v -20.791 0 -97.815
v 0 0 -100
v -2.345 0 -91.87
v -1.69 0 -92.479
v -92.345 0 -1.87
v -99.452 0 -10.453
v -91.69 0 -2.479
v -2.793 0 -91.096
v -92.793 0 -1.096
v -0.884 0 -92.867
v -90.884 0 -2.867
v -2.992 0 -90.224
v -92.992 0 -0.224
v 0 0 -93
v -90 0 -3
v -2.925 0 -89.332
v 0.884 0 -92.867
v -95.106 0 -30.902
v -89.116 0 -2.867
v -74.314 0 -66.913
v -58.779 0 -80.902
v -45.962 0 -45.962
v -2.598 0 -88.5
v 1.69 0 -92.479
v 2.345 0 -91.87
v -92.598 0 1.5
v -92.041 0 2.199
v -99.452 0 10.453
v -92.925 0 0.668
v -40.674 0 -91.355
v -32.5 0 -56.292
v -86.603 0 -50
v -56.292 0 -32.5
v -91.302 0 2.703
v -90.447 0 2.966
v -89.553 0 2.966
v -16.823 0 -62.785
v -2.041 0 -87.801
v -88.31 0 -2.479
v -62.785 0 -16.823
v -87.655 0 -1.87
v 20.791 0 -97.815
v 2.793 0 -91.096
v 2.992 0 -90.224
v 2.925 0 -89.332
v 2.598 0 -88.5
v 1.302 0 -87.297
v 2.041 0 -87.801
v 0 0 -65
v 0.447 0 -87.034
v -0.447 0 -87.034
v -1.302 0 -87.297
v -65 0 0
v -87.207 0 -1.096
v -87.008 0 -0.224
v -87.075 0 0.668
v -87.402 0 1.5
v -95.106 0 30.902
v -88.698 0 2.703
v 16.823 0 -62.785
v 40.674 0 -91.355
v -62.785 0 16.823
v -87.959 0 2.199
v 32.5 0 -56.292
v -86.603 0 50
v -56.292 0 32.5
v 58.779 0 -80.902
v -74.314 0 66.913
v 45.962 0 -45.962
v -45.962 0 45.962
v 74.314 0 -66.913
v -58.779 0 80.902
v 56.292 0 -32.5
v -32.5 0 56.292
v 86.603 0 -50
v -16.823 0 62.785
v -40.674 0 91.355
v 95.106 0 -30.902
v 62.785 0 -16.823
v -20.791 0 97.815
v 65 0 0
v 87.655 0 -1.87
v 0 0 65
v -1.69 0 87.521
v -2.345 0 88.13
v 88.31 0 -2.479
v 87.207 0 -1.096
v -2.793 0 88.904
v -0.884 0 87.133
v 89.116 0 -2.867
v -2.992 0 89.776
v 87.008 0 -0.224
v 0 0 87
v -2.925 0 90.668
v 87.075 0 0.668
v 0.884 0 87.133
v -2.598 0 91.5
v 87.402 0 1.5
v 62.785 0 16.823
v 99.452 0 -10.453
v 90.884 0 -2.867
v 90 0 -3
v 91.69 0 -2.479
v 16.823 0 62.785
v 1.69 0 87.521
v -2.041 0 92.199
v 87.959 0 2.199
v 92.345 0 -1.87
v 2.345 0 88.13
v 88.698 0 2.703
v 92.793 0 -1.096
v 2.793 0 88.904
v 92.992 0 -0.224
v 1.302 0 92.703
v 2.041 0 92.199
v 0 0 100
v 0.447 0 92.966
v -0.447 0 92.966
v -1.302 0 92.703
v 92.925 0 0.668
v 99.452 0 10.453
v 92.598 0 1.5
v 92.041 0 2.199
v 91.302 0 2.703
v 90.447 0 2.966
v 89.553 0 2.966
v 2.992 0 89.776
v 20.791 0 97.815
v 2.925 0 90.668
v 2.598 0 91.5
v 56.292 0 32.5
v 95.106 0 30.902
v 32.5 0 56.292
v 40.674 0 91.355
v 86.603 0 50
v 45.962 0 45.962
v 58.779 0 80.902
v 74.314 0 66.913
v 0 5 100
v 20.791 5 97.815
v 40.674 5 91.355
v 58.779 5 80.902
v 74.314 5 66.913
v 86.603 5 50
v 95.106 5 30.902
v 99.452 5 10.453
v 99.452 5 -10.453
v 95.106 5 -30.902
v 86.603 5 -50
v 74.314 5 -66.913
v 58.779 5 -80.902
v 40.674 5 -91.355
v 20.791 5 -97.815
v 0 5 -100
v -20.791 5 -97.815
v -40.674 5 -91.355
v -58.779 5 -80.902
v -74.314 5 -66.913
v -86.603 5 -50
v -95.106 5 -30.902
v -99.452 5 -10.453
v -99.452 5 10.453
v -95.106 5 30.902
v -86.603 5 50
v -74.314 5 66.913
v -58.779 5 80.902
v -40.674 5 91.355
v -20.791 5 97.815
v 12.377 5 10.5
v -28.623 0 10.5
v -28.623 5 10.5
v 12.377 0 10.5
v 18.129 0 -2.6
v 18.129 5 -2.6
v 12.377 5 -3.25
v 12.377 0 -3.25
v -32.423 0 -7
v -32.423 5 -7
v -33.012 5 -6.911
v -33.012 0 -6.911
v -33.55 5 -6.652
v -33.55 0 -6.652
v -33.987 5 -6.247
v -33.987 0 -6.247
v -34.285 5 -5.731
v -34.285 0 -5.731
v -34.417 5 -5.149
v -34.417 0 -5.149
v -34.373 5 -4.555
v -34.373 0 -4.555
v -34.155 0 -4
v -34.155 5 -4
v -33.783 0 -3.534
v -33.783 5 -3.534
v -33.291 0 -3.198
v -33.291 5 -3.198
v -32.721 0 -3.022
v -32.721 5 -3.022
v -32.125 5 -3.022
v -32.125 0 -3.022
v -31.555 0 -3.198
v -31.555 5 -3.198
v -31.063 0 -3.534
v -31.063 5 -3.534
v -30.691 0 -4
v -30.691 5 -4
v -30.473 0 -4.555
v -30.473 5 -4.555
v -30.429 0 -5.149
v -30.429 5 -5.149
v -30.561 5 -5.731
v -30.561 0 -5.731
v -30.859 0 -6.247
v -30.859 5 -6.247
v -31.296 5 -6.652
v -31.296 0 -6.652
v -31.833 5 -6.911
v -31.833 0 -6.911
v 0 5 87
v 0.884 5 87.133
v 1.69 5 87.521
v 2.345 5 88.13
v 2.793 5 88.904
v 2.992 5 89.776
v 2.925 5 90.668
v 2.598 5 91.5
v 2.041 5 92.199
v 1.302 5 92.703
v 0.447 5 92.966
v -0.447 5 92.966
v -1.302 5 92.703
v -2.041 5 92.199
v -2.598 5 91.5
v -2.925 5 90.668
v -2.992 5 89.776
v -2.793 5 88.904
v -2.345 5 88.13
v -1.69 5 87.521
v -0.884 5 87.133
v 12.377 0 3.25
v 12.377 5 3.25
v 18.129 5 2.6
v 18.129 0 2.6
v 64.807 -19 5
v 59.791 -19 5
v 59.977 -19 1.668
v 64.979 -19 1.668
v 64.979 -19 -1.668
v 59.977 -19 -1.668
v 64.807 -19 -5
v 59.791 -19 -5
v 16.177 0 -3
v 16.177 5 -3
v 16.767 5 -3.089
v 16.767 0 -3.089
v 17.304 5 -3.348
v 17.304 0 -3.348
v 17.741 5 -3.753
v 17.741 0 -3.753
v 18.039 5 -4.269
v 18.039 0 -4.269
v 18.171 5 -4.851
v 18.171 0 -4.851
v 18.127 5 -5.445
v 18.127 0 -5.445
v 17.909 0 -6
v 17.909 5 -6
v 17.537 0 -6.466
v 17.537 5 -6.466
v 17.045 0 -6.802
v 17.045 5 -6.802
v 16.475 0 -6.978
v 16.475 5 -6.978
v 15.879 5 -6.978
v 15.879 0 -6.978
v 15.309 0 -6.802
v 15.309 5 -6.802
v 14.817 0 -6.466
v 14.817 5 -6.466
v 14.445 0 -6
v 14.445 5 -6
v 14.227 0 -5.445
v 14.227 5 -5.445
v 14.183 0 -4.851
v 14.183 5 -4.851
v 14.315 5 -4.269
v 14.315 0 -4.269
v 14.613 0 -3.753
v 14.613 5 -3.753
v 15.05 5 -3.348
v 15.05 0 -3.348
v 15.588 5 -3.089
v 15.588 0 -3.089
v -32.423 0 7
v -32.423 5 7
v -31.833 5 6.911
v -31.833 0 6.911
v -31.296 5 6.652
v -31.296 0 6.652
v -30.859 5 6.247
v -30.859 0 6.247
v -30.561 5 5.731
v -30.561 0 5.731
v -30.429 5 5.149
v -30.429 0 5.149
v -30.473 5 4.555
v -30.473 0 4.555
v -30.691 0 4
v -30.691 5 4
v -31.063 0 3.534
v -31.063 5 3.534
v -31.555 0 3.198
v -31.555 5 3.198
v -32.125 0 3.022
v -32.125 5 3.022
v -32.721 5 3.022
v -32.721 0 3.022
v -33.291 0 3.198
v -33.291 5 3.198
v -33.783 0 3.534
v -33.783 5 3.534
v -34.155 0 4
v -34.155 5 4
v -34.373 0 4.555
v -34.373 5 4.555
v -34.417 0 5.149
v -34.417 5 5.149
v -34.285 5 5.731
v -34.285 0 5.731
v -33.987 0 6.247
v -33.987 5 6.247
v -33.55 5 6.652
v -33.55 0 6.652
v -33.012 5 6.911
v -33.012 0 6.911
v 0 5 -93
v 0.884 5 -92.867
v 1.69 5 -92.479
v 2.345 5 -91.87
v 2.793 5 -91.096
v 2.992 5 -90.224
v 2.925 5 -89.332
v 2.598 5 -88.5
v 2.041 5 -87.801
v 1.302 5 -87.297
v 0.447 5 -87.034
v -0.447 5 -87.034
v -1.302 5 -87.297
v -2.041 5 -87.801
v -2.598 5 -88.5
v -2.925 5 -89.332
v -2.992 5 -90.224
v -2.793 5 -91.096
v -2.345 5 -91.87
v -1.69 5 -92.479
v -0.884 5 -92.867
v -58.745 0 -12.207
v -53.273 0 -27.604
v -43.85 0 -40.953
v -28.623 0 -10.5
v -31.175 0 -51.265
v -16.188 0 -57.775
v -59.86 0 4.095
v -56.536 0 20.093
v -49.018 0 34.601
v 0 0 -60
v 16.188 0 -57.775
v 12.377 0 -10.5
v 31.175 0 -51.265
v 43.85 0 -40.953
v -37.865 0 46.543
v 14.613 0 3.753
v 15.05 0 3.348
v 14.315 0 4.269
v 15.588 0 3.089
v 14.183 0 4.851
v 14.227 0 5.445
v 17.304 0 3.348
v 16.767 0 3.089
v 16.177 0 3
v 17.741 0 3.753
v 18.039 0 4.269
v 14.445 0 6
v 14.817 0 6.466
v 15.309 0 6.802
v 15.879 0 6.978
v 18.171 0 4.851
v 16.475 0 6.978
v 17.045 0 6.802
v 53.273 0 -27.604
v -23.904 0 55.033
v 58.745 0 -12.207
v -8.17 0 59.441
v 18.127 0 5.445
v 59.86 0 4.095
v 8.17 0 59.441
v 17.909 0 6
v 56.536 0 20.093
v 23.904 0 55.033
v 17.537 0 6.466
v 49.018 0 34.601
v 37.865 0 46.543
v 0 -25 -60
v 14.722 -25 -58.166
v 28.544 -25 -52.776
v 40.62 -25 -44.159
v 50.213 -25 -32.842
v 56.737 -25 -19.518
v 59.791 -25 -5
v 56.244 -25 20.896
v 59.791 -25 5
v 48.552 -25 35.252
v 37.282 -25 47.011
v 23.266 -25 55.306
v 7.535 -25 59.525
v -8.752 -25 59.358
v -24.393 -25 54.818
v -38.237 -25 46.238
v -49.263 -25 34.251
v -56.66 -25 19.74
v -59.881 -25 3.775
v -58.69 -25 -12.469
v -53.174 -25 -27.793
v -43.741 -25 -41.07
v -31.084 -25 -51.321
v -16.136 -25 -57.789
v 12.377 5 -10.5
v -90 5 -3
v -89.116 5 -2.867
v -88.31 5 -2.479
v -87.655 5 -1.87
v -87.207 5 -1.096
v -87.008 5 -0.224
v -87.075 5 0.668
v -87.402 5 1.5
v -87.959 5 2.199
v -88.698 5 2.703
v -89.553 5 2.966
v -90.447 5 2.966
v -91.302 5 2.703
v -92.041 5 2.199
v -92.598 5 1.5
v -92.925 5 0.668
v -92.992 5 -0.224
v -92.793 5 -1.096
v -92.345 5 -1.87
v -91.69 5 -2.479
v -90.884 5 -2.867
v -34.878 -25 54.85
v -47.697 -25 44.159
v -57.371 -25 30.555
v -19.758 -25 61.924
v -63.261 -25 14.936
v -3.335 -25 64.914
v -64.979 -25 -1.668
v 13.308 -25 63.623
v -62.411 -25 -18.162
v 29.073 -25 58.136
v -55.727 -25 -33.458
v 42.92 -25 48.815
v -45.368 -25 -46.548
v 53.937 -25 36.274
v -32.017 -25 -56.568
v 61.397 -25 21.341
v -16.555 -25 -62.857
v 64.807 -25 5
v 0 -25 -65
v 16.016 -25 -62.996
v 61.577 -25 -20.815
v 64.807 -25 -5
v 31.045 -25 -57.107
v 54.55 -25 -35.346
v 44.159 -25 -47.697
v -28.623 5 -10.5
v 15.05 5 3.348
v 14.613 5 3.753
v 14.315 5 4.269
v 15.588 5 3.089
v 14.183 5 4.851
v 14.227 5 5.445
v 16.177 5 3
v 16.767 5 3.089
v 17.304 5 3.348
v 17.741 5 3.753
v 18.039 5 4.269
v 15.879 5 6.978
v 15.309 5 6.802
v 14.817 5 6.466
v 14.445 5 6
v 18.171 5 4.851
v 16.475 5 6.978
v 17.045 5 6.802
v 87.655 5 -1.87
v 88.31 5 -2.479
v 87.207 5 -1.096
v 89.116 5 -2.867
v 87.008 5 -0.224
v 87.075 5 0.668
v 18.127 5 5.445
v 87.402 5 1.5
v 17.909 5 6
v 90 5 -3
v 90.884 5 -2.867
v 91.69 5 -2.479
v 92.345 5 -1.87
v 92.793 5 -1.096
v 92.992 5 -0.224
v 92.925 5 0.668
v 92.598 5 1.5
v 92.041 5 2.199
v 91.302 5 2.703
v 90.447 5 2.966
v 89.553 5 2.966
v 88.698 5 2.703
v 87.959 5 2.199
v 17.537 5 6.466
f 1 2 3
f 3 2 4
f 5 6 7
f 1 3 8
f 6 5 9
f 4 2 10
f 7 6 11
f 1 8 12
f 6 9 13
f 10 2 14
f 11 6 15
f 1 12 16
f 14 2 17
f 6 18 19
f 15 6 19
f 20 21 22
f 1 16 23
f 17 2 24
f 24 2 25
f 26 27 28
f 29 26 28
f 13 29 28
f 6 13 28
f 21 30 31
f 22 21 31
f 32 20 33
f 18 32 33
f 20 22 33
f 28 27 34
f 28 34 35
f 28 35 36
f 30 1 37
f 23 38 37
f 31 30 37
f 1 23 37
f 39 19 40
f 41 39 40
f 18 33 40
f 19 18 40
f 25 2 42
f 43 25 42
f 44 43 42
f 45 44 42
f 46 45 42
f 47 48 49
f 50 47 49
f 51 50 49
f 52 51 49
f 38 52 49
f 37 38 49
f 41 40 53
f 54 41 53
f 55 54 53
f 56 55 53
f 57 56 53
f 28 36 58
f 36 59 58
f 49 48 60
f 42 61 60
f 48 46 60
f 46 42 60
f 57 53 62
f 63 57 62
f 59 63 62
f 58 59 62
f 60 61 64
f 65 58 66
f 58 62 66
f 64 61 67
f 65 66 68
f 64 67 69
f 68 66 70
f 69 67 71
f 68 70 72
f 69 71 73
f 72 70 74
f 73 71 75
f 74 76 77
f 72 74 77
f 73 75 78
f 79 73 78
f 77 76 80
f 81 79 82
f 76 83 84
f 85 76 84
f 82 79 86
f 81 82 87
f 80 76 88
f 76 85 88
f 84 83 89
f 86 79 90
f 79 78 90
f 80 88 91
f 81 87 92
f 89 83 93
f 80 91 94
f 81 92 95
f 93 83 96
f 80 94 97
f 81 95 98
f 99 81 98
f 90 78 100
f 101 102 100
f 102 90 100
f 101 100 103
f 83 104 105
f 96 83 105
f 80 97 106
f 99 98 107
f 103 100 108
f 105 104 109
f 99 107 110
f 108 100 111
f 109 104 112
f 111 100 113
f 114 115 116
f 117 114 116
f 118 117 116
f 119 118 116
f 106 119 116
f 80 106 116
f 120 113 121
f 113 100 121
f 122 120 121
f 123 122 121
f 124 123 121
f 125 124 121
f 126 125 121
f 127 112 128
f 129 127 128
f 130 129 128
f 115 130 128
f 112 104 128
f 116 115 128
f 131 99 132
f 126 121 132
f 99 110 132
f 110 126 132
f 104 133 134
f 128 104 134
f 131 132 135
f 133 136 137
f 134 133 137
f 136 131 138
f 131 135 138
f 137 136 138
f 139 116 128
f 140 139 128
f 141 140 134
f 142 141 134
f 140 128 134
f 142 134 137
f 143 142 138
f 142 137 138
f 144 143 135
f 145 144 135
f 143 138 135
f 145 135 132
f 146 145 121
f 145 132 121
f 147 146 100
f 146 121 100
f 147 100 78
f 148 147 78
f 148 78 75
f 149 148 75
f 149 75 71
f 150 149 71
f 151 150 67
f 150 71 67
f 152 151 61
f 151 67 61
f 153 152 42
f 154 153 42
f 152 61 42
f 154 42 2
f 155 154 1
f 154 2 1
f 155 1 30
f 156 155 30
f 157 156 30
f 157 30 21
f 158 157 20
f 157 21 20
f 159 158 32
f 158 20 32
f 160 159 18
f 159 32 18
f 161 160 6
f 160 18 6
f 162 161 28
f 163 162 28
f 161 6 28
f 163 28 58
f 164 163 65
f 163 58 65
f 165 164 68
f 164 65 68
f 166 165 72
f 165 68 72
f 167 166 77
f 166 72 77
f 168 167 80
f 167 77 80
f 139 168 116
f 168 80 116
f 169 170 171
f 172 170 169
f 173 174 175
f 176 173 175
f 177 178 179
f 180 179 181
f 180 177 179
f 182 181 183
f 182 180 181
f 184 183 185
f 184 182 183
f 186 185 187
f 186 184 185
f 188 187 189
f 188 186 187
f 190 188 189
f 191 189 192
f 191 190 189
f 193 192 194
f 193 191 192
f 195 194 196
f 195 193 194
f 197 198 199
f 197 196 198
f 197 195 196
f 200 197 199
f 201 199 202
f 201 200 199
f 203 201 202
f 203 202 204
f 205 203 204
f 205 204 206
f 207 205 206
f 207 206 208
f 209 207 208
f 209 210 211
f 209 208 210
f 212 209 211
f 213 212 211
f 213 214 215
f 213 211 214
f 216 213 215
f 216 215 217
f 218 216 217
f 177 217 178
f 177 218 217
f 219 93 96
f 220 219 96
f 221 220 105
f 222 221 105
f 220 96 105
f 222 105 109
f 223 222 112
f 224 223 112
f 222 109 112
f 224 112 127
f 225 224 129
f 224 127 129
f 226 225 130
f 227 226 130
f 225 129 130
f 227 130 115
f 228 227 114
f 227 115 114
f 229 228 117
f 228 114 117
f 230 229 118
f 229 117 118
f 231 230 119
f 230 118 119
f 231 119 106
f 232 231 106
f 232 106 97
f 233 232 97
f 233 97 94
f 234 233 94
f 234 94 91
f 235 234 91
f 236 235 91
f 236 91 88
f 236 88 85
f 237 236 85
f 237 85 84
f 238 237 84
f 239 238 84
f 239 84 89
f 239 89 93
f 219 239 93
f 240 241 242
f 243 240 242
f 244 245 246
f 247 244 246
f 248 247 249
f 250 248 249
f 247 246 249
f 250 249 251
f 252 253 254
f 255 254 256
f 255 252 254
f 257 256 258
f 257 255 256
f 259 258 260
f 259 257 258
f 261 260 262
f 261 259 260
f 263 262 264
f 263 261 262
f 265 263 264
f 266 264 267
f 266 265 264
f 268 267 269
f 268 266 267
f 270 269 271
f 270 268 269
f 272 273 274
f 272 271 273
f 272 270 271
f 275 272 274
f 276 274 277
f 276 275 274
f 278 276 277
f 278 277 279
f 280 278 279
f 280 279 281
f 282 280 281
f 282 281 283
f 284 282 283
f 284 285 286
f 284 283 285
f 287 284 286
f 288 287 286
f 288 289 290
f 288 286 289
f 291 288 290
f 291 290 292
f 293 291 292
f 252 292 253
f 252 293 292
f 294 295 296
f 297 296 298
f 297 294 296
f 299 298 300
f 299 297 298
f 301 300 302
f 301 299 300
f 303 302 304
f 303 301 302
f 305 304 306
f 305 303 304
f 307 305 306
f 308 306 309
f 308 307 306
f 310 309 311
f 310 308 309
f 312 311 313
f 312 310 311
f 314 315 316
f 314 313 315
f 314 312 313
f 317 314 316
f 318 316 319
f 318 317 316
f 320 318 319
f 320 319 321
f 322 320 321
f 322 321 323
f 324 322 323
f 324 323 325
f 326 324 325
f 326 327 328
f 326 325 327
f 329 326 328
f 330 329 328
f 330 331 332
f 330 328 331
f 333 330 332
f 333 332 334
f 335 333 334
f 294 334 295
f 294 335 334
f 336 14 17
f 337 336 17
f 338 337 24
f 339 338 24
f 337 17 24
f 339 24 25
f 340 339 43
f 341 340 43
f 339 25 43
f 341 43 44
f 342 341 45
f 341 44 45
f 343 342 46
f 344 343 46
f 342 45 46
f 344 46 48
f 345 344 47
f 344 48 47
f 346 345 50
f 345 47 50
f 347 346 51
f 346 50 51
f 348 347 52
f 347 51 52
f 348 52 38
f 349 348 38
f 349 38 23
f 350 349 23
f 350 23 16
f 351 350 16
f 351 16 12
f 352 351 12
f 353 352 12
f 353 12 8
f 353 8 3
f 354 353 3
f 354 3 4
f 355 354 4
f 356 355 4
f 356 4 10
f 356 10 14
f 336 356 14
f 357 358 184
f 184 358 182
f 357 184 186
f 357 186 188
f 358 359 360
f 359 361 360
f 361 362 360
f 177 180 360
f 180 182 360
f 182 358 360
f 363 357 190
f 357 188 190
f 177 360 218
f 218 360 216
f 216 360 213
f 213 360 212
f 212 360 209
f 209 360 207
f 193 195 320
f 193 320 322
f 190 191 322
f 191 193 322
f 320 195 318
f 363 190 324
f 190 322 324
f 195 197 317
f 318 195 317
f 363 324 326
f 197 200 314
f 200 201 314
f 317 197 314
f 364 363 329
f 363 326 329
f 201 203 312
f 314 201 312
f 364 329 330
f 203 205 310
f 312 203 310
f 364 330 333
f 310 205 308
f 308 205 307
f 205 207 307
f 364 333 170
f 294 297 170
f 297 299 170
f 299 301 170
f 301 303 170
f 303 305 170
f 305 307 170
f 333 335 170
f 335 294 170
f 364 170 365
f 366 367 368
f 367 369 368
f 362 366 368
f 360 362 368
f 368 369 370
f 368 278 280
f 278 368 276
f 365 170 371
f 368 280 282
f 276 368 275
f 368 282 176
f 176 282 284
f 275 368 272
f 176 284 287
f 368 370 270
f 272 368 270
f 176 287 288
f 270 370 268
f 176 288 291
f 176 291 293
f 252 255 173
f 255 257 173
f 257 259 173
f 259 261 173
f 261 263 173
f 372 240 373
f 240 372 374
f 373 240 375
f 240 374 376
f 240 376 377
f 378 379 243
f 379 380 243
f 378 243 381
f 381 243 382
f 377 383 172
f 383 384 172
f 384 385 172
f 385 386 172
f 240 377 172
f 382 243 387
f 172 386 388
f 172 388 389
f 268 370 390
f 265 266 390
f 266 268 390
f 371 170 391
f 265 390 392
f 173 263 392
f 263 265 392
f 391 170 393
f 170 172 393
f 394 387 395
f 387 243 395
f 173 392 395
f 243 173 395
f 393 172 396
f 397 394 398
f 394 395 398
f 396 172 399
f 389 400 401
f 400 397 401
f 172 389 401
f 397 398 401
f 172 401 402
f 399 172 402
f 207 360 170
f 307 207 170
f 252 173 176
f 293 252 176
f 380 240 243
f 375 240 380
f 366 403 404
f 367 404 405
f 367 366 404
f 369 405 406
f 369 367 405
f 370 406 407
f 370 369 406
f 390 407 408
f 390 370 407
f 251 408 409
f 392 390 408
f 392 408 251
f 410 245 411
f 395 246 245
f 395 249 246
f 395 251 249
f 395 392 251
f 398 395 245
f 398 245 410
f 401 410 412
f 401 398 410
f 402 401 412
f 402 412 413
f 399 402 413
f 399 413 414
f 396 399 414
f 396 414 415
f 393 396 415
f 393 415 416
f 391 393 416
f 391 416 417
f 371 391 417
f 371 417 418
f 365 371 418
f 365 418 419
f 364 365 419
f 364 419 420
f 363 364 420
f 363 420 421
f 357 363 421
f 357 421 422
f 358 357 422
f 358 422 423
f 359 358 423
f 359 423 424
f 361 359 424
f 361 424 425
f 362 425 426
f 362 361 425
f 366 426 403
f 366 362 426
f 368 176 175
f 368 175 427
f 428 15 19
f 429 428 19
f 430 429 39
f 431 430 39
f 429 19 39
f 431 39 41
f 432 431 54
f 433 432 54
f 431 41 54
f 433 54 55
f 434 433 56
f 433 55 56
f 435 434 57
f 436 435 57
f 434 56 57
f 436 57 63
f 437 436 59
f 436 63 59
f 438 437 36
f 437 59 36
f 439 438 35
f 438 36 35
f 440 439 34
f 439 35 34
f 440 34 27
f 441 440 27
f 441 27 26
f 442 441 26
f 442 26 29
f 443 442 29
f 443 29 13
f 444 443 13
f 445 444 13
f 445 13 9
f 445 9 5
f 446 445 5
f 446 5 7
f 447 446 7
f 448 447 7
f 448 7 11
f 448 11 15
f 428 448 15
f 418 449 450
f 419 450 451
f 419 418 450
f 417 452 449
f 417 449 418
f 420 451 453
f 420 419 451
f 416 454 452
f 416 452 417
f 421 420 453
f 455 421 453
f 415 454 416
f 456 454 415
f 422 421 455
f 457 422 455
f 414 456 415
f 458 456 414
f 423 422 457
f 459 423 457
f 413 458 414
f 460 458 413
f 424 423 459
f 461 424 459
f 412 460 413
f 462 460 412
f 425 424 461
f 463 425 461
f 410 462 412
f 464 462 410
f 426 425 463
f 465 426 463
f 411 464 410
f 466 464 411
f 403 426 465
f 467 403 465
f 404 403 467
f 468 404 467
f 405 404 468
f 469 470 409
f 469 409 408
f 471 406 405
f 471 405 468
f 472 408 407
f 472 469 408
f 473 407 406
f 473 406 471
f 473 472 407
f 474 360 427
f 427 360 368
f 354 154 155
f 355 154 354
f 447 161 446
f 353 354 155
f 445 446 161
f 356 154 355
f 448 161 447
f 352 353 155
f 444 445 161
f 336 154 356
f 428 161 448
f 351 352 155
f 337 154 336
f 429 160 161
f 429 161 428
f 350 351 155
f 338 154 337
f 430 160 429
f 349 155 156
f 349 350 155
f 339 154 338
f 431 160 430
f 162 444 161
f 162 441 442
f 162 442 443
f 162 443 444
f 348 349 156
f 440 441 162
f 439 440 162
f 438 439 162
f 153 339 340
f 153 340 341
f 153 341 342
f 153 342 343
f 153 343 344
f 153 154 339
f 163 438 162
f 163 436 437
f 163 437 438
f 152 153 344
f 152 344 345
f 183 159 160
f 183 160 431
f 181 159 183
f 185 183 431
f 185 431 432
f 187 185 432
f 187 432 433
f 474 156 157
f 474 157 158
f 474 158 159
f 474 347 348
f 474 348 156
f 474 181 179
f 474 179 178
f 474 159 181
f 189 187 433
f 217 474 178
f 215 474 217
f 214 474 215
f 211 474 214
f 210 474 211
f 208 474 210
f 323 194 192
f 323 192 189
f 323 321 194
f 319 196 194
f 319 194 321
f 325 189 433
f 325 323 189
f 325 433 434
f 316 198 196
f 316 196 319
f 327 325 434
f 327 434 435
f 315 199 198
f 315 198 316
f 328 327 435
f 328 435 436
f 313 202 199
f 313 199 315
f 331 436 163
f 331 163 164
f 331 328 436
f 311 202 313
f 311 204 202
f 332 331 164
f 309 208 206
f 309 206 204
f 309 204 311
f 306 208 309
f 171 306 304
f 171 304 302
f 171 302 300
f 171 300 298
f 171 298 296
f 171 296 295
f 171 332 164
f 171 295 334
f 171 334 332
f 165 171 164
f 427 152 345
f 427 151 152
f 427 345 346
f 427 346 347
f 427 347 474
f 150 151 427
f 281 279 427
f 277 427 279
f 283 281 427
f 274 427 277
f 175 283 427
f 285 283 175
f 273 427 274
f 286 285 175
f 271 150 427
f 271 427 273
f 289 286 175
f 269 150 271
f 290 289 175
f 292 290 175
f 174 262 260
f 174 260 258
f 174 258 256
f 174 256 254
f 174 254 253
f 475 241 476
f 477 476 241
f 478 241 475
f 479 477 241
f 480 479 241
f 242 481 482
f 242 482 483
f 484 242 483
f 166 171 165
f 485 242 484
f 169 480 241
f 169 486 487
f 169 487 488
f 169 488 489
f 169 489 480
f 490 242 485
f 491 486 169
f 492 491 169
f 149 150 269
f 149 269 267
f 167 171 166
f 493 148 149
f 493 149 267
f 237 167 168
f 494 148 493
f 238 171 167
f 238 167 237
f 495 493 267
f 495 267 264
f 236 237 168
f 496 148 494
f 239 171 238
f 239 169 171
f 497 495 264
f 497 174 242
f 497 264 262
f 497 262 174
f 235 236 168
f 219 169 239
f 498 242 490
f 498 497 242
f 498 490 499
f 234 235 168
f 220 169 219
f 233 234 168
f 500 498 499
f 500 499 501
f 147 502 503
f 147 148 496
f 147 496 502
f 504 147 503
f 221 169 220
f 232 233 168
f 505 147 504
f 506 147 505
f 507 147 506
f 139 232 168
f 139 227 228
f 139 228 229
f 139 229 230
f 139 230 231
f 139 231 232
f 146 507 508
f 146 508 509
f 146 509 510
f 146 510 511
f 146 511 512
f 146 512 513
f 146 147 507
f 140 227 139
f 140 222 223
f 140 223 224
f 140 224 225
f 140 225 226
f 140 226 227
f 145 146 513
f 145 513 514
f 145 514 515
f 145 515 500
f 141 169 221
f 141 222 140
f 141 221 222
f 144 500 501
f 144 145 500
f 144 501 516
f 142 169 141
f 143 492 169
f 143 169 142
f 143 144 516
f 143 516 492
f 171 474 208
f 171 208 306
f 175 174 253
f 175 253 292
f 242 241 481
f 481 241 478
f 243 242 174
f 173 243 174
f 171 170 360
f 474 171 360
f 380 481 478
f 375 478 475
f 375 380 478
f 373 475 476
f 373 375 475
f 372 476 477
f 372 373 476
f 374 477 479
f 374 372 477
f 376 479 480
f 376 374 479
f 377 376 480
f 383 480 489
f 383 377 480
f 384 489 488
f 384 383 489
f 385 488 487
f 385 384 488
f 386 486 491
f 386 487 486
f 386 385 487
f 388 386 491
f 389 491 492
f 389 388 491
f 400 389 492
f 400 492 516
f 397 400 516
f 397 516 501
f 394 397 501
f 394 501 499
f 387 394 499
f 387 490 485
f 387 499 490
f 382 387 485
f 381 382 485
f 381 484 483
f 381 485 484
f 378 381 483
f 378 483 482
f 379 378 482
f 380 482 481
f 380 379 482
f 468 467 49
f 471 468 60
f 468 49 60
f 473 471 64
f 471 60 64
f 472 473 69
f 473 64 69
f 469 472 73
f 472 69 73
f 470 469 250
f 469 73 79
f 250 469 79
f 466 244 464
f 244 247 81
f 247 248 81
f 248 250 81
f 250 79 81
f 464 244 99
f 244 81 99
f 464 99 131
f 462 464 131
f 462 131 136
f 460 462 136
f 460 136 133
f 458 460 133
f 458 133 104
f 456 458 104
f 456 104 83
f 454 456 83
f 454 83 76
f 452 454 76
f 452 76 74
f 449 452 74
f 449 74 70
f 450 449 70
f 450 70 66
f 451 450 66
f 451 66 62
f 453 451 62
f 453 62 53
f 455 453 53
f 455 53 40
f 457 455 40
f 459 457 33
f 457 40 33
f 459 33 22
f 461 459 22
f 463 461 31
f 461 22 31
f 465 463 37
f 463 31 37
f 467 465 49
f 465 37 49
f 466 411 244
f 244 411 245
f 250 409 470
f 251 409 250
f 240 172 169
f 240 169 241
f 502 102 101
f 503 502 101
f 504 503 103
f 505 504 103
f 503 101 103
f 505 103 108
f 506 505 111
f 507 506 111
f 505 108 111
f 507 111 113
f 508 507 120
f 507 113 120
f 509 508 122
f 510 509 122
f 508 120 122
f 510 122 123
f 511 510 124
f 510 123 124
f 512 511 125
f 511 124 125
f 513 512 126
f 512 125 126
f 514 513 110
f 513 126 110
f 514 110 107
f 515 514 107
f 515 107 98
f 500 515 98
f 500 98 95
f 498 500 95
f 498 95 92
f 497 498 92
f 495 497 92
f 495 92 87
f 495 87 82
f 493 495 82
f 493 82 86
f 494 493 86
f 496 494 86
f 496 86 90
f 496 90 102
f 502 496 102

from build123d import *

# Parameters (mm, degrees)
SKETCH_1_R          = 100
EXTRUDE_1_DEPTH     = 5
SKETCH_3_R          = 3
CUT_EXTRUDE_1_DEPTH = 142.509716981
SKETCH_2_R          = 2
SKETCH_2_W          = 41
SKETCH_2_H          = 21
CUT_EXTRUDE_3_DEPTH = 10
SKETCH_4_R          = 65
SKETCH_4_R_2        = 60
EXTRUDE_2_DEPTH     = 25
CUT_EXTRUDE_4_DEPTH = 145.568322948
SKETCH_6_W          = 10
SKETCH_6_H          = 6
CUT_EXTRUDE_5_DEPTH = 165.829829674


with BuildPart() as part:
    # 草图1 → 凸台-拉伸1 (new body)
    with BuildSketch(Plane(origin=(0, 0, 0), x_dir=(1, 0, 0), z_dir=(0, 1, 0))):
        with Locations(Location((0, 0, 0), (0, 0, 270))):
            Circle(SKETCH_1_R)
    extrude(amount=EXTRUDE_1_DEPTH)

    # 草图3 → 切除-拉伸1 (cut, through all)
    with BuildSketch(Plane.XZ):
        with Locations(Location((0, 90, 0), (0, 0, 270))):
            Circle(SKETCH_3_R)
        with Locations(Location((90, 0, 0), (0, 0, 270))):
            Circle(SKETCH_3_R)
        with Locations(Location((0, -90, 0), (0, 0, 270))):
            Circle(SKETCH_3_R)
        with Locations(Location((-90, 0, 0), (0, 0, 270))):
            Circle(SKETCH_3_R)
    extrude(amount=-CUT_EXTRUDE_1_DEPTH, mode=Mode.SUBTRACT)

    # 草图2 → 切除-拉伸3 (cut)
    with BuildSketch(Plane(origin=(0, 0, 0), x_dir=(1, 0, 0), z_dir=(0, 1, 0))):
        with Locations(Location((16.177013134, 5, 0), (0, 0, 270))):
            Circle(SKETCH_2_R)
        with Locations(Location((16.177013134, -5, 0), (0, 0, 90))):
            Circle(SKETCH_2_R)
        with Locations(Location((-32.422986866, -5, 0), (0, 0, 270))):
            Circle(SKETCH_2_R)
        with Locations(Location((-32.422986866, 5, 0), (0, 0, 90))):
            Circle(SKETCH_2_R)
        with Locations((-8.122986866, 0)):
            Rectangle(SKETCH_2_W, SKETCH_2_H)
    extrude(amount=CUT_EXTRUDE_3_DEPTH, mode=Mode.SUBTRACT)

    # 草图4 → 凸台-拉伸2 (add)
    with BuildSketch(Plane.XZ):
        with Locations(Location((0, 0, 0), (0, 0, 270))):
            Circle(SKETCH_4_R)
        with Locations(Location((0, 0, 0), (0, 0, 270))):
            Circle(SKETCH_4_R_2, mode=Mode.SUBTRACT)
    extrude(amount=EXTRUDE_2_DEPTH)

    # 草图5 → 切除-拉伸4 (cut, through all)
    with BuildSketch(Plane(origin=(0, 5, 0), x_dir=(1, 0, 0), z_dir=(0, 1, 0))):
        Polygon((12.377013134, 3.25), (12.377013134, 0), (18.12919557, 0), (18.12919557, 2.6), align=None)
        Polygon((12.377013134, 0), (12.377013134, -3.25), (18.12919557, -2.6), (18.12919557, 0), align=None)
    extrude(amount=-CUT_EXTRUDE_4_DEPTH, mode=Mode.SUBTRACT)

    # 草图6 → 切除-拉伸5 (cut, through all)
    with BuildSketch(Plane(origin=(-28.622986866, 0, 0), x_dir=(0, 0, -1), z_dir=(1, 0, 0))):
        with Locations((0, -22)):
            Rectangle(SKETCH_6_W, SKETCH_6_H)
    extrude(amount=CUT_EXTRUDE_5_DEPTH, mode=Mode.SUBTRACT)


solid = part.part
